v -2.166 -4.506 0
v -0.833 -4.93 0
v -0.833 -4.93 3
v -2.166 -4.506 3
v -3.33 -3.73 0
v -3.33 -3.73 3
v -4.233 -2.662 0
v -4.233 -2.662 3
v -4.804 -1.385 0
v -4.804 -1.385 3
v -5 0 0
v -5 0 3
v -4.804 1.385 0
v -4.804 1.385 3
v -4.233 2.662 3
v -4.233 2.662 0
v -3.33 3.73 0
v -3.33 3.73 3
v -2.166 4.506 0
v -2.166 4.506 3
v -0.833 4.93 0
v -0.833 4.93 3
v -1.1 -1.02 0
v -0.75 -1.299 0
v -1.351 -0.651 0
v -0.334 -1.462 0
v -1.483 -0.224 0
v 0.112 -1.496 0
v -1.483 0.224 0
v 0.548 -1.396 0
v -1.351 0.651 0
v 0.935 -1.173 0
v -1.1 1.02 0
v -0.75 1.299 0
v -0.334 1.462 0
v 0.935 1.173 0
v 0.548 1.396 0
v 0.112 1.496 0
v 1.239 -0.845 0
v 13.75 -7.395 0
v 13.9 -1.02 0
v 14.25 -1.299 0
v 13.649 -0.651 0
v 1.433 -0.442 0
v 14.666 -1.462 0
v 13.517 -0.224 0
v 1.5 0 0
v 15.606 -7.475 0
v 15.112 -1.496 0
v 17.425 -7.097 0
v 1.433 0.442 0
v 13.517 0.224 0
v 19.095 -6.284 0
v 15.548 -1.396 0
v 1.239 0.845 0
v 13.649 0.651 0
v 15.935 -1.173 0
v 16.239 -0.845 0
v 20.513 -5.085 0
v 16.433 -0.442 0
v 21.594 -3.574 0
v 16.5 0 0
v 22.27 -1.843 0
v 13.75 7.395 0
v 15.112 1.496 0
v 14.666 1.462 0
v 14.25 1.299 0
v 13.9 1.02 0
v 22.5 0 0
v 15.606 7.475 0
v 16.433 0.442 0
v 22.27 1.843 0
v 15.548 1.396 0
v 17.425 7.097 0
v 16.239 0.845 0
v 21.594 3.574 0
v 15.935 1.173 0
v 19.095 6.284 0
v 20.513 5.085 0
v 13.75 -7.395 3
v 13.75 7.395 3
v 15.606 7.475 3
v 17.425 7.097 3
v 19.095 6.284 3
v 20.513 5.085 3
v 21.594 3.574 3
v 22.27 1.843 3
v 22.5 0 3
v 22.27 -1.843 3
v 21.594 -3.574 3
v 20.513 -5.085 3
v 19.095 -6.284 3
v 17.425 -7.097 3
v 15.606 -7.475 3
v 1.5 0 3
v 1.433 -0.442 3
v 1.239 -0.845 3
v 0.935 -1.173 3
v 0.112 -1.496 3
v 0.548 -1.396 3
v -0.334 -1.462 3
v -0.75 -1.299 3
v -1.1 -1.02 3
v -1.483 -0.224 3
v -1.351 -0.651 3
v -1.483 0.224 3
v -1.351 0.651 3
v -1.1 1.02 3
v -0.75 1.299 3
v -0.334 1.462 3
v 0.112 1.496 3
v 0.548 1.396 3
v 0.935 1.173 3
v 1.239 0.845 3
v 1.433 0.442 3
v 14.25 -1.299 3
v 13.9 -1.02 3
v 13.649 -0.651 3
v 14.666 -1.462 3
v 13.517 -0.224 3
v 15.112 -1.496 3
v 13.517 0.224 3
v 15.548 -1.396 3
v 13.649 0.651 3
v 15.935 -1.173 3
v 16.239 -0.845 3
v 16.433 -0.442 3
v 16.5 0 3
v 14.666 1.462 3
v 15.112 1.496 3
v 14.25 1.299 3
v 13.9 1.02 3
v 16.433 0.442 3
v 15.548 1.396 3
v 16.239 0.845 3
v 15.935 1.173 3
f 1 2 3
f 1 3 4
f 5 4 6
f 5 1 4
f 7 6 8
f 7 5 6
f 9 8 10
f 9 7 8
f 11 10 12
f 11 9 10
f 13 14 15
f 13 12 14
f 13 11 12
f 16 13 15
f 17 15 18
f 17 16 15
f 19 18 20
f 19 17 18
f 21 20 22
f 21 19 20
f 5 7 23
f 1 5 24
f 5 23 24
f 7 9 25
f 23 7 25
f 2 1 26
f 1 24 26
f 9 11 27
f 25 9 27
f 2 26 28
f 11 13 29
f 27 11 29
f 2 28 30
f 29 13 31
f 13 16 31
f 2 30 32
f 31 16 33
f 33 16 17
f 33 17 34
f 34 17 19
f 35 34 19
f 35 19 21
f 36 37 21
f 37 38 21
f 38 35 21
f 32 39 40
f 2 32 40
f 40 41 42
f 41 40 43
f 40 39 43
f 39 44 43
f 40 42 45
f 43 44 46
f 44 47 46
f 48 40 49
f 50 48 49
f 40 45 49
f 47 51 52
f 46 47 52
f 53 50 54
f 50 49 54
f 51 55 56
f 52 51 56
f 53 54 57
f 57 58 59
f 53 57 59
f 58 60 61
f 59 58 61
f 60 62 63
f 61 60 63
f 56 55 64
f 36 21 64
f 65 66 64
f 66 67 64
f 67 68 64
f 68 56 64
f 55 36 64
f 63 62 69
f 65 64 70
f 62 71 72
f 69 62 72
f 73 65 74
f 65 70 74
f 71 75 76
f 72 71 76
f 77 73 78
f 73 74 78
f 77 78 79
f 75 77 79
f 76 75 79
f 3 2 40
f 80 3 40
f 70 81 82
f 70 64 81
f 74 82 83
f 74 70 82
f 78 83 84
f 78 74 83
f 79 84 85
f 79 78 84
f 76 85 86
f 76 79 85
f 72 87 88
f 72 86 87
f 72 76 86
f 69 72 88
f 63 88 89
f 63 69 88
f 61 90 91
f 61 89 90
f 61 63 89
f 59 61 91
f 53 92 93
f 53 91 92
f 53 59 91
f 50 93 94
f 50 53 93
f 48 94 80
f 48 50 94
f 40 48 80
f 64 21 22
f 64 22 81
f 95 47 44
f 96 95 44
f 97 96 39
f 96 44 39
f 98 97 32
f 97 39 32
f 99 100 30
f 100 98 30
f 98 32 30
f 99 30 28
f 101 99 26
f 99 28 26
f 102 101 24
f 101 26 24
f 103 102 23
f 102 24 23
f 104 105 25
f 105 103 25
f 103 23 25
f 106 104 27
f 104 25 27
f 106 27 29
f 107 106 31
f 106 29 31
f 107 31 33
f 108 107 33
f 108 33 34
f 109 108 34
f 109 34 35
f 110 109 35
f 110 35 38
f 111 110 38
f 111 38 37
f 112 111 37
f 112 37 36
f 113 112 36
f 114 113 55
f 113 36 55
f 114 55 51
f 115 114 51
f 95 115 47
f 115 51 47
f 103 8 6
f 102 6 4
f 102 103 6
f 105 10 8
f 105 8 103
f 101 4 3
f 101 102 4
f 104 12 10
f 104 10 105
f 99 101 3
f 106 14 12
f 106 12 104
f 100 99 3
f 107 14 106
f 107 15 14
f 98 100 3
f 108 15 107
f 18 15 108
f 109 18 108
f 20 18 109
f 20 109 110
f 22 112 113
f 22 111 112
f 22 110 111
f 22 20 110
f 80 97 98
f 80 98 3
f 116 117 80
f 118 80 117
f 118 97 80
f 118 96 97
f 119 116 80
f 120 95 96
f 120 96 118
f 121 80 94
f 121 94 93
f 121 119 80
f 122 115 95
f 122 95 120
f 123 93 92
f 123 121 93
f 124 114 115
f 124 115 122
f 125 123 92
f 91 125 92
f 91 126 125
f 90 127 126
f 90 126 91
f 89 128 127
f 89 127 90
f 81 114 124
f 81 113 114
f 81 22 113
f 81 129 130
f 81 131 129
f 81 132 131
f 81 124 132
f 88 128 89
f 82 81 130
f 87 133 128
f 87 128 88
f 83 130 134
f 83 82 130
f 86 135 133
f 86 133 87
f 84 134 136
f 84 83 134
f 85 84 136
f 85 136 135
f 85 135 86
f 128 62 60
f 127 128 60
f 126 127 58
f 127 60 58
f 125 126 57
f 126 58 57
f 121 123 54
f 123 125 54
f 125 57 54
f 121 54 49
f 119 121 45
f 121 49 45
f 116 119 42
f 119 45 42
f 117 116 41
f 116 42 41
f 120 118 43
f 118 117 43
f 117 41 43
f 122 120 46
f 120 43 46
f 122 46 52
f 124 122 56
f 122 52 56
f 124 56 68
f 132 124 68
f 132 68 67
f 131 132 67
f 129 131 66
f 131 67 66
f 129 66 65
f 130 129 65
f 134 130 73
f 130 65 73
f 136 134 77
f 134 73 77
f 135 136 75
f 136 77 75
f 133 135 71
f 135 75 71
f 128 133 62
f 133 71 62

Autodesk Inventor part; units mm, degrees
ref_plane "YZ Plane" through (0, 0, 0) normal (1, 0, 0) x (0, 1, 0)
ref_plane "XZ Plane" through (0, 0, 0) normal (0, 1, 0) x (-1, 0, 0)
ref_plane "XY Plane" through (0, 0, 0) normal (0, 0, 1) x (1, 0, 0)
sketch "スケッチ1" plane through (0, 0, 0) normal (0, 0, 1) x (1, 0, 0)
  circle A0 centre (0, 0) radius 1.5
  circle A1 centre (15, 0) radius 1.5
  arc A2 (-0.8333, 4.9301) -> (-0.8333, -4.9301) centre (0, 0) ccw
  arc A3 (13.75, -7.3951) -> (13.75, 7.3951) centre (15, 0) ccw
  line L0 (-0.8333, 4.9301) -> (13.75, 7.3951)
  line L1 (-0.8333, -4.9301) -> (13.75, -7.3951)
  dimension "d0" = 3
  dimension "d1" = 3
  dimension "d2" = 15
  dimension "d3" = 10
  dimension "d4" = 15
extrude "押し出し1" add sketch "スケッチ1" along normal blind 3
properties part number "ウイング抑え" material "ポリカーボネート、クリア"
